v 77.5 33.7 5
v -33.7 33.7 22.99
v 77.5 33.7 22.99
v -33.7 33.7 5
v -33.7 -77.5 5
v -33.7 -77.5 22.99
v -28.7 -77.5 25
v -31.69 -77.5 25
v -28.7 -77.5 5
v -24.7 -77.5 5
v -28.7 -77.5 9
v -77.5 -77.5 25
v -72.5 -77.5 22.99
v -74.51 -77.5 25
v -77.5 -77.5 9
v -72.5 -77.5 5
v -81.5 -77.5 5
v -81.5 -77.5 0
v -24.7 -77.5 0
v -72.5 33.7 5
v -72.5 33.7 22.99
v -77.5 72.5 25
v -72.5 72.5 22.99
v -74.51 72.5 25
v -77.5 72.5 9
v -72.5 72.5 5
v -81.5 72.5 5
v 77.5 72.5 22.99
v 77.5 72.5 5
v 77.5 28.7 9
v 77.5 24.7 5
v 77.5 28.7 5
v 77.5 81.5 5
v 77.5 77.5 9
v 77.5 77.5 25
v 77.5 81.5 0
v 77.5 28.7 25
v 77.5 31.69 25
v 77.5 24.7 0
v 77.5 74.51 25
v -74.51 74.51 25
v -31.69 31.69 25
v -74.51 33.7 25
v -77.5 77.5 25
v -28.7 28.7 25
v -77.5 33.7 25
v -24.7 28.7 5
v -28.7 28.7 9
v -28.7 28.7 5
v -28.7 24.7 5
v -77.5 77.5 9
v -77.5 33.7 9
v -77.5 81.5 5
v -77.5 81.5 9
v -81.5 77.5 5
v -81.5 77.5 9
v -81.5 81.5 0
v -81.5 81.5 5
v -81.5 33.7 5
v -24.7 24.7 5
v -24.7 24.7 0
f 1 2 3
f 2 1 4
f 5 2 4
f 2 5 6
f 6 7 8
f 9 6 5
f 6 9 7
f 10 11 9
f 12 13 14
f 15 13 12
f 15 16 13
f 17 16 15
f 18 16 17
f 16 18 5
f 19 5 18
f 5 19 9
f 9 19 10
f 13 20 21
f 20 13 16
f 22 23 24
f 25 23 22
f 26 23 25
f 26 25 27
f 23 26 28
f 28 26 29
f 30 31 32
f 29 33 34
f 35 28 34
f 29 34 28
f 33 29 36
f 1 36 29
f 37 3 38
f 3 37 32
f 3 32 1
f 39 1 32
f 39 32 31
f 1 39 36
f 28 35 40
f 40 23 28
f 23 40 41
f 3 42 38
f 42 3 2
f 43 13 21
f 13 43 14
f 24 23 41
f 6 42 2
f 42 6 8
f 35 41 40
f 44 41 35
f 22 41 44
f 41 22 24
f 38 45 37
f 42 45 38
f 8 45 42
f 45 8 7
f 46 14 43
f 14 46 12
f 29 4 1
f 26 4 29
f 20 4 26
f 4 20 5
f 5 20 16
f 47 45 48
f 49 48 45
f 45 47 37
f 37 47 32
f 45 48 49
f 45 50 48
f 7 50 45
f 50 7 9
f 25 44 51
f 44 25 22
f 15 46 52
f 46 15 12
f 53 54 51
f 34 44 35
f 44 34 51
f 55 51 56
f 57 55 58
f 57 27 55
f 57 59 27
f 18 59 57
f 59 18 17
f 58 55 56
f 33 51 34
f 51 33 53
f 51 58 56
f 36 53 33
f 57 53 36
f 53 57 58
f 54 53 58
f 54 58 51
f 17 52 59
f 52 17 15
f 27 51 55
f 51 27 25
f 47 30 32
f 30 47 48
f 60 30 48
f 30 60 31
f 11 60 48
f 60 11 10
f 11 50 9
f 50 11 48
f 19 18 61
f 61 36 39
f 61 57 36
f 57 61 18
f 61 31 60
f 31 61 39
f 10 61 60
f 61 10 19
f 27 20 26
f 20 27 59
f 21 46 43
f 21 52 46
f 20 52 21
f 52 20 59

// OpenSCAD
// ============================================================
// 90 Degree Beam Corner Jig
//
// A right-angle channel jig for holding two large timber beams
// square to each other while they are glued, screwed or bolted.
//
// The jig is an L-shaped tray that drops down over the corner
// from above. Each arm is a full U-groove: an outer wall and an
// inner wall capture BOTH side faces of its beam, so the beams
// cannot splay or twist. The top plate holds them coplanar.
//
// The two outer walls meet at the origin and form the 90 degree
// reference; the two inner walls form a matching 90 degree
// reference at (gb, ga). The corner square itself is left open
// (no inner walls) so it works whichever beam runs through and
// whichever butts into it.
//
// Coordinate system (as used, "demo" part):
//   Origin  = outer corner of the joint.
//   +X      = along beam A, +Y = along beam B.
//   z = 0   = top face of the beams / underside of the plate.
//   Plate occupies z = 0 .. plate_thickness.
//   Walls hang down, z = -groove_depth .. 0.
//
// The "jig" part flips this so the plate lies on the bed and the
// walls point up — prints as a shallow tray, no supports, and the
// layer lines run across the walls rather than along the joint.
//
// Print two and use them as a pair, one gripping the top of the beams
// and one the bottom. Turn the lower one over about the diagonal of its
// own corner and its grooves land back on the same two beams. See
// part = "pair".
//
// Note that turning it over is the ONLY way to invert it and still land
// on the same beams, and that rotation swaps the two arms. So anything
// asymmetric between the arms — see t_relief — swaps over with it, and
// the two halves of a pair are then not the same print.
//
// It does T joints as well as L joints; see t_relief.
//
// Standalone — no external dependencies.
//
// All units: millimeters.
// ============================================================

/* [Beams] */
beam_a_width  = 38;   // Width of beam A, measured across the X arm
beam_b_width  = 38;   // Width of beam B, measured across the Y arm
beam_depth    = 220;  // Beam depth — the dimension the walls reach down
groove_depth  = 20;   // How far the walls reach down the beam sides
clearance     = 0.8;  // Slip fit added to each groove width

/* [Jig] */
arm_length      = 150;  // Length of each arm, from the outer corner
plate_thickness = 5;    // Top plate thickness
wall_thickness  = 5;    // Wall thickness
fillet_radius   = 4;    // Fillet at the root of every wall
lead_in         = 2;    // Chamfer flaring the mouth of the grooves

/* [T Joint] */
// Gap the outer wall where it crosses a groove, so that beam can run
// straight on through the corner instead of ending at it — which turns
// the L jig into a T jig. The plate is untouched: it passes over the
// through beam, so the jig loses no stiffness.
//   "none" — L joint only, both outer walls continuous
//   "a"    — beam A runs through, beam B butts into it
//   "b"    — beam B runs through, beam A butts into it
//   "both" — either. The ONLY setting where a top-and-bottom pair of the
//            same printed part both open the same way — see part = "pair"
t_relief = "a";  // [none, a, b, both]

/* [Fixings] */
screw_holes    = false;  // Holes through the walls for temporary screws
screw_diameter = 5.5;    // Clearance diameter (5.5 suits a 5 mm screw)

/* [Demo] */
demo_beam_overrun = 90;  // Beam length beyond the jig, demo parts only

/* [Quality] */
$fa = 1;
$fs = 0.4;

/* [Render] */
part = "jig";  // [jig, demo, pair]

// ============================================================
// DERIVED
// ============================================================

ga = beam_a_width + clearance;   // Groove width of the X arm
gb = beam_b_width + clearance;   // Groove width of the Y arm
wt = wall_thickness;
pt = plate_thickness;
al = arm_length;

eps = 0.01;

// Sanity guards — these would produce inverted geometry rather than
// an obvious error, so fail loudly instead.
assert(al > max(ga, gb) + wt,
       "arm_length must be longer than the wider groove plus a wall");
assert(groove_depth > fillet_radius + lead_in,
       "groove_depth must exceed fillet_radius + lead_in");
// A top and a bottom jig grip opposite ends of the same beam depth, so
// between them they must not meet in the middle.
assert(2 * groove_depth < beam_depth,
       "groove_depth must be under half beam_depth, or a top and bottom jig collide");
assert(t_relief == "none" || t_relief == "a" || t_relief == "b" || t_relief == "both",
       "t_relief must be none, a, b or both");

// ============================================================
// 2D OUTLINES
// ============================================================

// Groove cavity of the X arm — open at x = al, closed at x = 0.
module cavity_a() {
    square([al, ga]);
}

// Groove cavity of the Y arm — open at y = al, closed at y = 0.
module cavity_b() {
    square([gb, al]);
}

// The full L-shaped cavity.
module cavity_outline() {
    cavity_a();
    cavity_b();
}

// Footprint of the walls: each cavity grown by one wall thickness on
// its outer and inner edge. The two outer walls run right through the
// corner and meet there — that continuous corner is what sets the
// 90 degree reference, and it ties the two arms together.
module wall_outline() {
    translate([-wt, -wt]) square([al + wt, ga + 2 * wt]);
    translate([-wt, -wt]) square([gb + 2 * wt, al + wt]);
}

// Footprint of the top plate: the wall footprint plus fillet_radius on
// every outboard face. That overhang is the ledge the wall-root fillets
// stand on — see wall_fillets().
module plate_outline() {
    fr = fillet_radius;
    translate([-wt - fr, -wt - fr]) square([al + wt + fr, ga + 2 * (wt + fr)]);
    translate([-wt - fr, -wt - fr]) square([gb + 2 * (wt + fr), al + wt + fr]);
}

// ============================================================
// MODULES
// ============================================================

// The wall band, before the groove is cut out of it.
module wall_blank() {
    translate([0, 0, -groove_depth])
        linear_extrude(height = groove_depth)
            wall_outline();
}

// The top plate.
module plate() {
    linear_extrude(height = pt) plate_outline();
}

// The L-shaped groove, plus a 45 degree flare at its mouth so the
// jig drops onto rough-sawn timber without fighting.
module groove() {
    translate([0, 0, -groove_depth - 1])
        linear_extrude(height = groove_depth + 1 + eps)
            cavity_outline();

    // Flared mouth — one hull per arm, since the L is not convex.
    hull() {
        translate([0, 0, -groove_depth + lead_in])
            linear_extrude(height = eps) cavity_a();
        translate([0, 0, -groove_depth - 1])
            linear_extrude(height = eps) offset(delta = lead_in + 1) cavity_a();
    }
    hull() {
        translate([0, 0, -groove_depth + lead_in])
            linear_extrude(height = eps) cavity_b();
        translate([0, 0, -groove_depth - 1])
            linear_extrude(height = eps) offset(delta = lead_in + 1) cavity_b();
    }
}

// A fillet prism running along +X, occupying y = 0..r and z = -r..0.
// Fills the concave corner made by a wall face on the XZ plane (wall
// body at y < 0) meeting the plate underside at z = 0.
module fillet_prism(len, r) {
    rotate([0, 90, 0])
        linear_extrude(height = len)
            polygon([[0, 0], [0, r], [r, 0]]);
}

// Fillets at the root of all four wall runs. These carry the bending
// load where the walls meet the plate — the weakest place in a printed
// part, since it is a layer boundary.
//
// They sit on the OUTBOARD face of every wall, never inside a groove.
// A fillet on the groove side would pack out the corner the beam's own
// arris has to occupy, so the beam would ride up on the two slopes
// instead of seating flat against the plate and registering on the wall
// faces. That is why plate_outline() carries fillet_radius of extra
// plate beyond each outboard face — it is the ledge these sit on.
module wall_fillets() {
    r = fillet_radius;

    // Outer wall of the X arm — outboard face at y = -wt.
    translate([al, -wt, 0]) rotate([0, 0, 180])
        fillet_prism(al + wt + r, r);

    // Outer wall of the Y arm — outboard face at x = -wt.
    translate([-wt, -wt - r, 0]) rotate([0, 0, 90])
        fillet_prism(al + wt + r, r);

    // Inner wall of the X arm — outboard face at y = ga + wt.
    translate([gb, ga + wt, 0])
        fillet_prism(al - gb, r);

    // Inner wall of the Y arm — outboard face at x = gb + wt.
    translate([gb + wt, al, 0]) rotate([0, 0, -90])
        fillet_prism(al - ga, r);
}

// Gaps cut through the outer wall — and its root fillet — where a beam
// runs on through the corner. Cut to exactly z = 0, so the plate above
// is left whole.
module t_relief_cuts() {
    fr = fillet_radius;

    // Across the end of the X arm's groove, freeing beam A.
    if (t_relief == "a" || t_relief == "both")
        translate([-wt - fr - 1, 0, -groove_depth - 1])
            cube([wt + fr + 1, ga, groove_depth + 1]);

    // Across the end of the Y arm's groove, freeing beam B.
    if (t_relief == "b" || t_relief == "both")
        translate([0, -wt - fr - 1, -groove_depth - 1])
            cube([gb, wt + fr + 1, groove_depth + 1]);

    // With both grooves freed, the block where the two outer walls used
    // to meet is left touching neither beam and hanging off the plate on
    // its own — a spindly stub that would only snap off. Take it away.
    if (t_relief == "both")
        translate([-wt - fr - 1, -wt - fr - 1, -groove_depth - 1])
            cube([wt + fr + 1, wt + fr + 1, groove_depth + 1]);
}

// A single horizontal hole, axis along +Y, drilled through a wall.
module wall_hole() {
    translate([0, -1, -groove_depth / 2])
        rotate([-90, 0, 0])
            cylinder(h = wt + 2, d = screw_diameter);
}

// Clearance holes so the jig can be screwed to the beams while the
// joint is fixed, then unscrewed and lifted off.
module screw_cuts() {
    // Outer wall of the X arm.
    for (f = [0.35, 0.72])
        translate([al * f, -wt, 0]) wall_hole();

    // Outer wall of the Y arm.
    for (f = [0.35, 0.72])
        translate([-wt, al * f, 0]) rotate([0, 0, -90]) wall_hole();

    // Inner wall of the X arm.
    for (f = [0.4, 0.8])
        translate([gb + (al - gb) * f, ga + wt, 0]) rotate([0, 0, 180]) wall_hole();

    // Inner wall of the Y arm.
    for (f = [0.4, 0.8])
        translate([gb + wt, ga + (al - ga) * f, 0]) rotate([0, 0, 90]) wall_hole();
}

// The finished jig, in the orientation it is used in.
module jig() {
    difference() {
        union() {
            plate();
            difference() {
                wall_blank();
                groove();
            }
            wall_fillets();
        }
        if (screw_holes) screw_cuts();
        t_relief_cuts();
    }
}

// Ghost beams, for checking the fit.
module demo_beams() {
    t = beam_depth;
    o = demo_beam_overrun;

    // A freed groove is drawn with its beam running on through the
    // corner, so the demo shows the joint the current t_relief allows:
    // an L when nothing is freed, a T when something is.
    a_start = t_relief == "b" ? beam_b_width
            : t_relief == "none" ? 0
            : -o;
    b_start = t_relief == "b" ? -o : beam_a_width;

    // Beam A — runs along X.
    translate([a_start, 0, -t])
        cube([al + o - a_start, beam_a_width, t]);

    // Beam B — runs along Y.
    translate([0, b_start, -t])
        cube([beam_b_width, al + o - b_start, t]);
}

// ============================================================
// RENDER
// ============================================================
// This is a one-piece model, so the usual bottom/top/both/exploded
// selector does not apply. "jig" is the print orientation, "demo" shows
// one jig working on a corner, and "pair" shows two of the same printed
// part gripping the beams top and bottom.

if (part == "jig") {
    // Flip so the plate lies on the bed and the walls point up:
    // no supports, and the walls print with their layers stacked
    // across the direction the beams push.
    translate([-(al - wt) / 2, (al - wt) / 2, pt])
        rotate([180, 0, 0])
            jig();

} else if (part == "demo") {
    jig();
    %demo_beams();

} else if (part == "pair") {
    // The lower jig is turned over about the diagonal of its own corner
    // — a real 180 degree rotation, not a mirror — which lands its
    // grooves back on the same two beams. Only works while the two beams
    // are the same width.
    assert(beam_a_width == beam_b_width,
           "a pair needs equal beam widths, otherwise print a mirrored second jig");
    // That rotation swaps the arms, so it swaps which groove is freed.
    if (t_relief == "a" || t_relief == "b")
        echo("NOTE: with t_relief a or b the pair is two DIFFERENT prints — print the other setting for the lower jig, or use t_relief = \"both\" for one part that does either.");
    jig();
    translate([0, 0, -beam_depth]) rotate(a = 180, v = [1, 1, 0]) jig();
    %demo_beams();

} else {
    echo("Unknown part — use \"jig\", \"demo\" or \"pair\"");
}
